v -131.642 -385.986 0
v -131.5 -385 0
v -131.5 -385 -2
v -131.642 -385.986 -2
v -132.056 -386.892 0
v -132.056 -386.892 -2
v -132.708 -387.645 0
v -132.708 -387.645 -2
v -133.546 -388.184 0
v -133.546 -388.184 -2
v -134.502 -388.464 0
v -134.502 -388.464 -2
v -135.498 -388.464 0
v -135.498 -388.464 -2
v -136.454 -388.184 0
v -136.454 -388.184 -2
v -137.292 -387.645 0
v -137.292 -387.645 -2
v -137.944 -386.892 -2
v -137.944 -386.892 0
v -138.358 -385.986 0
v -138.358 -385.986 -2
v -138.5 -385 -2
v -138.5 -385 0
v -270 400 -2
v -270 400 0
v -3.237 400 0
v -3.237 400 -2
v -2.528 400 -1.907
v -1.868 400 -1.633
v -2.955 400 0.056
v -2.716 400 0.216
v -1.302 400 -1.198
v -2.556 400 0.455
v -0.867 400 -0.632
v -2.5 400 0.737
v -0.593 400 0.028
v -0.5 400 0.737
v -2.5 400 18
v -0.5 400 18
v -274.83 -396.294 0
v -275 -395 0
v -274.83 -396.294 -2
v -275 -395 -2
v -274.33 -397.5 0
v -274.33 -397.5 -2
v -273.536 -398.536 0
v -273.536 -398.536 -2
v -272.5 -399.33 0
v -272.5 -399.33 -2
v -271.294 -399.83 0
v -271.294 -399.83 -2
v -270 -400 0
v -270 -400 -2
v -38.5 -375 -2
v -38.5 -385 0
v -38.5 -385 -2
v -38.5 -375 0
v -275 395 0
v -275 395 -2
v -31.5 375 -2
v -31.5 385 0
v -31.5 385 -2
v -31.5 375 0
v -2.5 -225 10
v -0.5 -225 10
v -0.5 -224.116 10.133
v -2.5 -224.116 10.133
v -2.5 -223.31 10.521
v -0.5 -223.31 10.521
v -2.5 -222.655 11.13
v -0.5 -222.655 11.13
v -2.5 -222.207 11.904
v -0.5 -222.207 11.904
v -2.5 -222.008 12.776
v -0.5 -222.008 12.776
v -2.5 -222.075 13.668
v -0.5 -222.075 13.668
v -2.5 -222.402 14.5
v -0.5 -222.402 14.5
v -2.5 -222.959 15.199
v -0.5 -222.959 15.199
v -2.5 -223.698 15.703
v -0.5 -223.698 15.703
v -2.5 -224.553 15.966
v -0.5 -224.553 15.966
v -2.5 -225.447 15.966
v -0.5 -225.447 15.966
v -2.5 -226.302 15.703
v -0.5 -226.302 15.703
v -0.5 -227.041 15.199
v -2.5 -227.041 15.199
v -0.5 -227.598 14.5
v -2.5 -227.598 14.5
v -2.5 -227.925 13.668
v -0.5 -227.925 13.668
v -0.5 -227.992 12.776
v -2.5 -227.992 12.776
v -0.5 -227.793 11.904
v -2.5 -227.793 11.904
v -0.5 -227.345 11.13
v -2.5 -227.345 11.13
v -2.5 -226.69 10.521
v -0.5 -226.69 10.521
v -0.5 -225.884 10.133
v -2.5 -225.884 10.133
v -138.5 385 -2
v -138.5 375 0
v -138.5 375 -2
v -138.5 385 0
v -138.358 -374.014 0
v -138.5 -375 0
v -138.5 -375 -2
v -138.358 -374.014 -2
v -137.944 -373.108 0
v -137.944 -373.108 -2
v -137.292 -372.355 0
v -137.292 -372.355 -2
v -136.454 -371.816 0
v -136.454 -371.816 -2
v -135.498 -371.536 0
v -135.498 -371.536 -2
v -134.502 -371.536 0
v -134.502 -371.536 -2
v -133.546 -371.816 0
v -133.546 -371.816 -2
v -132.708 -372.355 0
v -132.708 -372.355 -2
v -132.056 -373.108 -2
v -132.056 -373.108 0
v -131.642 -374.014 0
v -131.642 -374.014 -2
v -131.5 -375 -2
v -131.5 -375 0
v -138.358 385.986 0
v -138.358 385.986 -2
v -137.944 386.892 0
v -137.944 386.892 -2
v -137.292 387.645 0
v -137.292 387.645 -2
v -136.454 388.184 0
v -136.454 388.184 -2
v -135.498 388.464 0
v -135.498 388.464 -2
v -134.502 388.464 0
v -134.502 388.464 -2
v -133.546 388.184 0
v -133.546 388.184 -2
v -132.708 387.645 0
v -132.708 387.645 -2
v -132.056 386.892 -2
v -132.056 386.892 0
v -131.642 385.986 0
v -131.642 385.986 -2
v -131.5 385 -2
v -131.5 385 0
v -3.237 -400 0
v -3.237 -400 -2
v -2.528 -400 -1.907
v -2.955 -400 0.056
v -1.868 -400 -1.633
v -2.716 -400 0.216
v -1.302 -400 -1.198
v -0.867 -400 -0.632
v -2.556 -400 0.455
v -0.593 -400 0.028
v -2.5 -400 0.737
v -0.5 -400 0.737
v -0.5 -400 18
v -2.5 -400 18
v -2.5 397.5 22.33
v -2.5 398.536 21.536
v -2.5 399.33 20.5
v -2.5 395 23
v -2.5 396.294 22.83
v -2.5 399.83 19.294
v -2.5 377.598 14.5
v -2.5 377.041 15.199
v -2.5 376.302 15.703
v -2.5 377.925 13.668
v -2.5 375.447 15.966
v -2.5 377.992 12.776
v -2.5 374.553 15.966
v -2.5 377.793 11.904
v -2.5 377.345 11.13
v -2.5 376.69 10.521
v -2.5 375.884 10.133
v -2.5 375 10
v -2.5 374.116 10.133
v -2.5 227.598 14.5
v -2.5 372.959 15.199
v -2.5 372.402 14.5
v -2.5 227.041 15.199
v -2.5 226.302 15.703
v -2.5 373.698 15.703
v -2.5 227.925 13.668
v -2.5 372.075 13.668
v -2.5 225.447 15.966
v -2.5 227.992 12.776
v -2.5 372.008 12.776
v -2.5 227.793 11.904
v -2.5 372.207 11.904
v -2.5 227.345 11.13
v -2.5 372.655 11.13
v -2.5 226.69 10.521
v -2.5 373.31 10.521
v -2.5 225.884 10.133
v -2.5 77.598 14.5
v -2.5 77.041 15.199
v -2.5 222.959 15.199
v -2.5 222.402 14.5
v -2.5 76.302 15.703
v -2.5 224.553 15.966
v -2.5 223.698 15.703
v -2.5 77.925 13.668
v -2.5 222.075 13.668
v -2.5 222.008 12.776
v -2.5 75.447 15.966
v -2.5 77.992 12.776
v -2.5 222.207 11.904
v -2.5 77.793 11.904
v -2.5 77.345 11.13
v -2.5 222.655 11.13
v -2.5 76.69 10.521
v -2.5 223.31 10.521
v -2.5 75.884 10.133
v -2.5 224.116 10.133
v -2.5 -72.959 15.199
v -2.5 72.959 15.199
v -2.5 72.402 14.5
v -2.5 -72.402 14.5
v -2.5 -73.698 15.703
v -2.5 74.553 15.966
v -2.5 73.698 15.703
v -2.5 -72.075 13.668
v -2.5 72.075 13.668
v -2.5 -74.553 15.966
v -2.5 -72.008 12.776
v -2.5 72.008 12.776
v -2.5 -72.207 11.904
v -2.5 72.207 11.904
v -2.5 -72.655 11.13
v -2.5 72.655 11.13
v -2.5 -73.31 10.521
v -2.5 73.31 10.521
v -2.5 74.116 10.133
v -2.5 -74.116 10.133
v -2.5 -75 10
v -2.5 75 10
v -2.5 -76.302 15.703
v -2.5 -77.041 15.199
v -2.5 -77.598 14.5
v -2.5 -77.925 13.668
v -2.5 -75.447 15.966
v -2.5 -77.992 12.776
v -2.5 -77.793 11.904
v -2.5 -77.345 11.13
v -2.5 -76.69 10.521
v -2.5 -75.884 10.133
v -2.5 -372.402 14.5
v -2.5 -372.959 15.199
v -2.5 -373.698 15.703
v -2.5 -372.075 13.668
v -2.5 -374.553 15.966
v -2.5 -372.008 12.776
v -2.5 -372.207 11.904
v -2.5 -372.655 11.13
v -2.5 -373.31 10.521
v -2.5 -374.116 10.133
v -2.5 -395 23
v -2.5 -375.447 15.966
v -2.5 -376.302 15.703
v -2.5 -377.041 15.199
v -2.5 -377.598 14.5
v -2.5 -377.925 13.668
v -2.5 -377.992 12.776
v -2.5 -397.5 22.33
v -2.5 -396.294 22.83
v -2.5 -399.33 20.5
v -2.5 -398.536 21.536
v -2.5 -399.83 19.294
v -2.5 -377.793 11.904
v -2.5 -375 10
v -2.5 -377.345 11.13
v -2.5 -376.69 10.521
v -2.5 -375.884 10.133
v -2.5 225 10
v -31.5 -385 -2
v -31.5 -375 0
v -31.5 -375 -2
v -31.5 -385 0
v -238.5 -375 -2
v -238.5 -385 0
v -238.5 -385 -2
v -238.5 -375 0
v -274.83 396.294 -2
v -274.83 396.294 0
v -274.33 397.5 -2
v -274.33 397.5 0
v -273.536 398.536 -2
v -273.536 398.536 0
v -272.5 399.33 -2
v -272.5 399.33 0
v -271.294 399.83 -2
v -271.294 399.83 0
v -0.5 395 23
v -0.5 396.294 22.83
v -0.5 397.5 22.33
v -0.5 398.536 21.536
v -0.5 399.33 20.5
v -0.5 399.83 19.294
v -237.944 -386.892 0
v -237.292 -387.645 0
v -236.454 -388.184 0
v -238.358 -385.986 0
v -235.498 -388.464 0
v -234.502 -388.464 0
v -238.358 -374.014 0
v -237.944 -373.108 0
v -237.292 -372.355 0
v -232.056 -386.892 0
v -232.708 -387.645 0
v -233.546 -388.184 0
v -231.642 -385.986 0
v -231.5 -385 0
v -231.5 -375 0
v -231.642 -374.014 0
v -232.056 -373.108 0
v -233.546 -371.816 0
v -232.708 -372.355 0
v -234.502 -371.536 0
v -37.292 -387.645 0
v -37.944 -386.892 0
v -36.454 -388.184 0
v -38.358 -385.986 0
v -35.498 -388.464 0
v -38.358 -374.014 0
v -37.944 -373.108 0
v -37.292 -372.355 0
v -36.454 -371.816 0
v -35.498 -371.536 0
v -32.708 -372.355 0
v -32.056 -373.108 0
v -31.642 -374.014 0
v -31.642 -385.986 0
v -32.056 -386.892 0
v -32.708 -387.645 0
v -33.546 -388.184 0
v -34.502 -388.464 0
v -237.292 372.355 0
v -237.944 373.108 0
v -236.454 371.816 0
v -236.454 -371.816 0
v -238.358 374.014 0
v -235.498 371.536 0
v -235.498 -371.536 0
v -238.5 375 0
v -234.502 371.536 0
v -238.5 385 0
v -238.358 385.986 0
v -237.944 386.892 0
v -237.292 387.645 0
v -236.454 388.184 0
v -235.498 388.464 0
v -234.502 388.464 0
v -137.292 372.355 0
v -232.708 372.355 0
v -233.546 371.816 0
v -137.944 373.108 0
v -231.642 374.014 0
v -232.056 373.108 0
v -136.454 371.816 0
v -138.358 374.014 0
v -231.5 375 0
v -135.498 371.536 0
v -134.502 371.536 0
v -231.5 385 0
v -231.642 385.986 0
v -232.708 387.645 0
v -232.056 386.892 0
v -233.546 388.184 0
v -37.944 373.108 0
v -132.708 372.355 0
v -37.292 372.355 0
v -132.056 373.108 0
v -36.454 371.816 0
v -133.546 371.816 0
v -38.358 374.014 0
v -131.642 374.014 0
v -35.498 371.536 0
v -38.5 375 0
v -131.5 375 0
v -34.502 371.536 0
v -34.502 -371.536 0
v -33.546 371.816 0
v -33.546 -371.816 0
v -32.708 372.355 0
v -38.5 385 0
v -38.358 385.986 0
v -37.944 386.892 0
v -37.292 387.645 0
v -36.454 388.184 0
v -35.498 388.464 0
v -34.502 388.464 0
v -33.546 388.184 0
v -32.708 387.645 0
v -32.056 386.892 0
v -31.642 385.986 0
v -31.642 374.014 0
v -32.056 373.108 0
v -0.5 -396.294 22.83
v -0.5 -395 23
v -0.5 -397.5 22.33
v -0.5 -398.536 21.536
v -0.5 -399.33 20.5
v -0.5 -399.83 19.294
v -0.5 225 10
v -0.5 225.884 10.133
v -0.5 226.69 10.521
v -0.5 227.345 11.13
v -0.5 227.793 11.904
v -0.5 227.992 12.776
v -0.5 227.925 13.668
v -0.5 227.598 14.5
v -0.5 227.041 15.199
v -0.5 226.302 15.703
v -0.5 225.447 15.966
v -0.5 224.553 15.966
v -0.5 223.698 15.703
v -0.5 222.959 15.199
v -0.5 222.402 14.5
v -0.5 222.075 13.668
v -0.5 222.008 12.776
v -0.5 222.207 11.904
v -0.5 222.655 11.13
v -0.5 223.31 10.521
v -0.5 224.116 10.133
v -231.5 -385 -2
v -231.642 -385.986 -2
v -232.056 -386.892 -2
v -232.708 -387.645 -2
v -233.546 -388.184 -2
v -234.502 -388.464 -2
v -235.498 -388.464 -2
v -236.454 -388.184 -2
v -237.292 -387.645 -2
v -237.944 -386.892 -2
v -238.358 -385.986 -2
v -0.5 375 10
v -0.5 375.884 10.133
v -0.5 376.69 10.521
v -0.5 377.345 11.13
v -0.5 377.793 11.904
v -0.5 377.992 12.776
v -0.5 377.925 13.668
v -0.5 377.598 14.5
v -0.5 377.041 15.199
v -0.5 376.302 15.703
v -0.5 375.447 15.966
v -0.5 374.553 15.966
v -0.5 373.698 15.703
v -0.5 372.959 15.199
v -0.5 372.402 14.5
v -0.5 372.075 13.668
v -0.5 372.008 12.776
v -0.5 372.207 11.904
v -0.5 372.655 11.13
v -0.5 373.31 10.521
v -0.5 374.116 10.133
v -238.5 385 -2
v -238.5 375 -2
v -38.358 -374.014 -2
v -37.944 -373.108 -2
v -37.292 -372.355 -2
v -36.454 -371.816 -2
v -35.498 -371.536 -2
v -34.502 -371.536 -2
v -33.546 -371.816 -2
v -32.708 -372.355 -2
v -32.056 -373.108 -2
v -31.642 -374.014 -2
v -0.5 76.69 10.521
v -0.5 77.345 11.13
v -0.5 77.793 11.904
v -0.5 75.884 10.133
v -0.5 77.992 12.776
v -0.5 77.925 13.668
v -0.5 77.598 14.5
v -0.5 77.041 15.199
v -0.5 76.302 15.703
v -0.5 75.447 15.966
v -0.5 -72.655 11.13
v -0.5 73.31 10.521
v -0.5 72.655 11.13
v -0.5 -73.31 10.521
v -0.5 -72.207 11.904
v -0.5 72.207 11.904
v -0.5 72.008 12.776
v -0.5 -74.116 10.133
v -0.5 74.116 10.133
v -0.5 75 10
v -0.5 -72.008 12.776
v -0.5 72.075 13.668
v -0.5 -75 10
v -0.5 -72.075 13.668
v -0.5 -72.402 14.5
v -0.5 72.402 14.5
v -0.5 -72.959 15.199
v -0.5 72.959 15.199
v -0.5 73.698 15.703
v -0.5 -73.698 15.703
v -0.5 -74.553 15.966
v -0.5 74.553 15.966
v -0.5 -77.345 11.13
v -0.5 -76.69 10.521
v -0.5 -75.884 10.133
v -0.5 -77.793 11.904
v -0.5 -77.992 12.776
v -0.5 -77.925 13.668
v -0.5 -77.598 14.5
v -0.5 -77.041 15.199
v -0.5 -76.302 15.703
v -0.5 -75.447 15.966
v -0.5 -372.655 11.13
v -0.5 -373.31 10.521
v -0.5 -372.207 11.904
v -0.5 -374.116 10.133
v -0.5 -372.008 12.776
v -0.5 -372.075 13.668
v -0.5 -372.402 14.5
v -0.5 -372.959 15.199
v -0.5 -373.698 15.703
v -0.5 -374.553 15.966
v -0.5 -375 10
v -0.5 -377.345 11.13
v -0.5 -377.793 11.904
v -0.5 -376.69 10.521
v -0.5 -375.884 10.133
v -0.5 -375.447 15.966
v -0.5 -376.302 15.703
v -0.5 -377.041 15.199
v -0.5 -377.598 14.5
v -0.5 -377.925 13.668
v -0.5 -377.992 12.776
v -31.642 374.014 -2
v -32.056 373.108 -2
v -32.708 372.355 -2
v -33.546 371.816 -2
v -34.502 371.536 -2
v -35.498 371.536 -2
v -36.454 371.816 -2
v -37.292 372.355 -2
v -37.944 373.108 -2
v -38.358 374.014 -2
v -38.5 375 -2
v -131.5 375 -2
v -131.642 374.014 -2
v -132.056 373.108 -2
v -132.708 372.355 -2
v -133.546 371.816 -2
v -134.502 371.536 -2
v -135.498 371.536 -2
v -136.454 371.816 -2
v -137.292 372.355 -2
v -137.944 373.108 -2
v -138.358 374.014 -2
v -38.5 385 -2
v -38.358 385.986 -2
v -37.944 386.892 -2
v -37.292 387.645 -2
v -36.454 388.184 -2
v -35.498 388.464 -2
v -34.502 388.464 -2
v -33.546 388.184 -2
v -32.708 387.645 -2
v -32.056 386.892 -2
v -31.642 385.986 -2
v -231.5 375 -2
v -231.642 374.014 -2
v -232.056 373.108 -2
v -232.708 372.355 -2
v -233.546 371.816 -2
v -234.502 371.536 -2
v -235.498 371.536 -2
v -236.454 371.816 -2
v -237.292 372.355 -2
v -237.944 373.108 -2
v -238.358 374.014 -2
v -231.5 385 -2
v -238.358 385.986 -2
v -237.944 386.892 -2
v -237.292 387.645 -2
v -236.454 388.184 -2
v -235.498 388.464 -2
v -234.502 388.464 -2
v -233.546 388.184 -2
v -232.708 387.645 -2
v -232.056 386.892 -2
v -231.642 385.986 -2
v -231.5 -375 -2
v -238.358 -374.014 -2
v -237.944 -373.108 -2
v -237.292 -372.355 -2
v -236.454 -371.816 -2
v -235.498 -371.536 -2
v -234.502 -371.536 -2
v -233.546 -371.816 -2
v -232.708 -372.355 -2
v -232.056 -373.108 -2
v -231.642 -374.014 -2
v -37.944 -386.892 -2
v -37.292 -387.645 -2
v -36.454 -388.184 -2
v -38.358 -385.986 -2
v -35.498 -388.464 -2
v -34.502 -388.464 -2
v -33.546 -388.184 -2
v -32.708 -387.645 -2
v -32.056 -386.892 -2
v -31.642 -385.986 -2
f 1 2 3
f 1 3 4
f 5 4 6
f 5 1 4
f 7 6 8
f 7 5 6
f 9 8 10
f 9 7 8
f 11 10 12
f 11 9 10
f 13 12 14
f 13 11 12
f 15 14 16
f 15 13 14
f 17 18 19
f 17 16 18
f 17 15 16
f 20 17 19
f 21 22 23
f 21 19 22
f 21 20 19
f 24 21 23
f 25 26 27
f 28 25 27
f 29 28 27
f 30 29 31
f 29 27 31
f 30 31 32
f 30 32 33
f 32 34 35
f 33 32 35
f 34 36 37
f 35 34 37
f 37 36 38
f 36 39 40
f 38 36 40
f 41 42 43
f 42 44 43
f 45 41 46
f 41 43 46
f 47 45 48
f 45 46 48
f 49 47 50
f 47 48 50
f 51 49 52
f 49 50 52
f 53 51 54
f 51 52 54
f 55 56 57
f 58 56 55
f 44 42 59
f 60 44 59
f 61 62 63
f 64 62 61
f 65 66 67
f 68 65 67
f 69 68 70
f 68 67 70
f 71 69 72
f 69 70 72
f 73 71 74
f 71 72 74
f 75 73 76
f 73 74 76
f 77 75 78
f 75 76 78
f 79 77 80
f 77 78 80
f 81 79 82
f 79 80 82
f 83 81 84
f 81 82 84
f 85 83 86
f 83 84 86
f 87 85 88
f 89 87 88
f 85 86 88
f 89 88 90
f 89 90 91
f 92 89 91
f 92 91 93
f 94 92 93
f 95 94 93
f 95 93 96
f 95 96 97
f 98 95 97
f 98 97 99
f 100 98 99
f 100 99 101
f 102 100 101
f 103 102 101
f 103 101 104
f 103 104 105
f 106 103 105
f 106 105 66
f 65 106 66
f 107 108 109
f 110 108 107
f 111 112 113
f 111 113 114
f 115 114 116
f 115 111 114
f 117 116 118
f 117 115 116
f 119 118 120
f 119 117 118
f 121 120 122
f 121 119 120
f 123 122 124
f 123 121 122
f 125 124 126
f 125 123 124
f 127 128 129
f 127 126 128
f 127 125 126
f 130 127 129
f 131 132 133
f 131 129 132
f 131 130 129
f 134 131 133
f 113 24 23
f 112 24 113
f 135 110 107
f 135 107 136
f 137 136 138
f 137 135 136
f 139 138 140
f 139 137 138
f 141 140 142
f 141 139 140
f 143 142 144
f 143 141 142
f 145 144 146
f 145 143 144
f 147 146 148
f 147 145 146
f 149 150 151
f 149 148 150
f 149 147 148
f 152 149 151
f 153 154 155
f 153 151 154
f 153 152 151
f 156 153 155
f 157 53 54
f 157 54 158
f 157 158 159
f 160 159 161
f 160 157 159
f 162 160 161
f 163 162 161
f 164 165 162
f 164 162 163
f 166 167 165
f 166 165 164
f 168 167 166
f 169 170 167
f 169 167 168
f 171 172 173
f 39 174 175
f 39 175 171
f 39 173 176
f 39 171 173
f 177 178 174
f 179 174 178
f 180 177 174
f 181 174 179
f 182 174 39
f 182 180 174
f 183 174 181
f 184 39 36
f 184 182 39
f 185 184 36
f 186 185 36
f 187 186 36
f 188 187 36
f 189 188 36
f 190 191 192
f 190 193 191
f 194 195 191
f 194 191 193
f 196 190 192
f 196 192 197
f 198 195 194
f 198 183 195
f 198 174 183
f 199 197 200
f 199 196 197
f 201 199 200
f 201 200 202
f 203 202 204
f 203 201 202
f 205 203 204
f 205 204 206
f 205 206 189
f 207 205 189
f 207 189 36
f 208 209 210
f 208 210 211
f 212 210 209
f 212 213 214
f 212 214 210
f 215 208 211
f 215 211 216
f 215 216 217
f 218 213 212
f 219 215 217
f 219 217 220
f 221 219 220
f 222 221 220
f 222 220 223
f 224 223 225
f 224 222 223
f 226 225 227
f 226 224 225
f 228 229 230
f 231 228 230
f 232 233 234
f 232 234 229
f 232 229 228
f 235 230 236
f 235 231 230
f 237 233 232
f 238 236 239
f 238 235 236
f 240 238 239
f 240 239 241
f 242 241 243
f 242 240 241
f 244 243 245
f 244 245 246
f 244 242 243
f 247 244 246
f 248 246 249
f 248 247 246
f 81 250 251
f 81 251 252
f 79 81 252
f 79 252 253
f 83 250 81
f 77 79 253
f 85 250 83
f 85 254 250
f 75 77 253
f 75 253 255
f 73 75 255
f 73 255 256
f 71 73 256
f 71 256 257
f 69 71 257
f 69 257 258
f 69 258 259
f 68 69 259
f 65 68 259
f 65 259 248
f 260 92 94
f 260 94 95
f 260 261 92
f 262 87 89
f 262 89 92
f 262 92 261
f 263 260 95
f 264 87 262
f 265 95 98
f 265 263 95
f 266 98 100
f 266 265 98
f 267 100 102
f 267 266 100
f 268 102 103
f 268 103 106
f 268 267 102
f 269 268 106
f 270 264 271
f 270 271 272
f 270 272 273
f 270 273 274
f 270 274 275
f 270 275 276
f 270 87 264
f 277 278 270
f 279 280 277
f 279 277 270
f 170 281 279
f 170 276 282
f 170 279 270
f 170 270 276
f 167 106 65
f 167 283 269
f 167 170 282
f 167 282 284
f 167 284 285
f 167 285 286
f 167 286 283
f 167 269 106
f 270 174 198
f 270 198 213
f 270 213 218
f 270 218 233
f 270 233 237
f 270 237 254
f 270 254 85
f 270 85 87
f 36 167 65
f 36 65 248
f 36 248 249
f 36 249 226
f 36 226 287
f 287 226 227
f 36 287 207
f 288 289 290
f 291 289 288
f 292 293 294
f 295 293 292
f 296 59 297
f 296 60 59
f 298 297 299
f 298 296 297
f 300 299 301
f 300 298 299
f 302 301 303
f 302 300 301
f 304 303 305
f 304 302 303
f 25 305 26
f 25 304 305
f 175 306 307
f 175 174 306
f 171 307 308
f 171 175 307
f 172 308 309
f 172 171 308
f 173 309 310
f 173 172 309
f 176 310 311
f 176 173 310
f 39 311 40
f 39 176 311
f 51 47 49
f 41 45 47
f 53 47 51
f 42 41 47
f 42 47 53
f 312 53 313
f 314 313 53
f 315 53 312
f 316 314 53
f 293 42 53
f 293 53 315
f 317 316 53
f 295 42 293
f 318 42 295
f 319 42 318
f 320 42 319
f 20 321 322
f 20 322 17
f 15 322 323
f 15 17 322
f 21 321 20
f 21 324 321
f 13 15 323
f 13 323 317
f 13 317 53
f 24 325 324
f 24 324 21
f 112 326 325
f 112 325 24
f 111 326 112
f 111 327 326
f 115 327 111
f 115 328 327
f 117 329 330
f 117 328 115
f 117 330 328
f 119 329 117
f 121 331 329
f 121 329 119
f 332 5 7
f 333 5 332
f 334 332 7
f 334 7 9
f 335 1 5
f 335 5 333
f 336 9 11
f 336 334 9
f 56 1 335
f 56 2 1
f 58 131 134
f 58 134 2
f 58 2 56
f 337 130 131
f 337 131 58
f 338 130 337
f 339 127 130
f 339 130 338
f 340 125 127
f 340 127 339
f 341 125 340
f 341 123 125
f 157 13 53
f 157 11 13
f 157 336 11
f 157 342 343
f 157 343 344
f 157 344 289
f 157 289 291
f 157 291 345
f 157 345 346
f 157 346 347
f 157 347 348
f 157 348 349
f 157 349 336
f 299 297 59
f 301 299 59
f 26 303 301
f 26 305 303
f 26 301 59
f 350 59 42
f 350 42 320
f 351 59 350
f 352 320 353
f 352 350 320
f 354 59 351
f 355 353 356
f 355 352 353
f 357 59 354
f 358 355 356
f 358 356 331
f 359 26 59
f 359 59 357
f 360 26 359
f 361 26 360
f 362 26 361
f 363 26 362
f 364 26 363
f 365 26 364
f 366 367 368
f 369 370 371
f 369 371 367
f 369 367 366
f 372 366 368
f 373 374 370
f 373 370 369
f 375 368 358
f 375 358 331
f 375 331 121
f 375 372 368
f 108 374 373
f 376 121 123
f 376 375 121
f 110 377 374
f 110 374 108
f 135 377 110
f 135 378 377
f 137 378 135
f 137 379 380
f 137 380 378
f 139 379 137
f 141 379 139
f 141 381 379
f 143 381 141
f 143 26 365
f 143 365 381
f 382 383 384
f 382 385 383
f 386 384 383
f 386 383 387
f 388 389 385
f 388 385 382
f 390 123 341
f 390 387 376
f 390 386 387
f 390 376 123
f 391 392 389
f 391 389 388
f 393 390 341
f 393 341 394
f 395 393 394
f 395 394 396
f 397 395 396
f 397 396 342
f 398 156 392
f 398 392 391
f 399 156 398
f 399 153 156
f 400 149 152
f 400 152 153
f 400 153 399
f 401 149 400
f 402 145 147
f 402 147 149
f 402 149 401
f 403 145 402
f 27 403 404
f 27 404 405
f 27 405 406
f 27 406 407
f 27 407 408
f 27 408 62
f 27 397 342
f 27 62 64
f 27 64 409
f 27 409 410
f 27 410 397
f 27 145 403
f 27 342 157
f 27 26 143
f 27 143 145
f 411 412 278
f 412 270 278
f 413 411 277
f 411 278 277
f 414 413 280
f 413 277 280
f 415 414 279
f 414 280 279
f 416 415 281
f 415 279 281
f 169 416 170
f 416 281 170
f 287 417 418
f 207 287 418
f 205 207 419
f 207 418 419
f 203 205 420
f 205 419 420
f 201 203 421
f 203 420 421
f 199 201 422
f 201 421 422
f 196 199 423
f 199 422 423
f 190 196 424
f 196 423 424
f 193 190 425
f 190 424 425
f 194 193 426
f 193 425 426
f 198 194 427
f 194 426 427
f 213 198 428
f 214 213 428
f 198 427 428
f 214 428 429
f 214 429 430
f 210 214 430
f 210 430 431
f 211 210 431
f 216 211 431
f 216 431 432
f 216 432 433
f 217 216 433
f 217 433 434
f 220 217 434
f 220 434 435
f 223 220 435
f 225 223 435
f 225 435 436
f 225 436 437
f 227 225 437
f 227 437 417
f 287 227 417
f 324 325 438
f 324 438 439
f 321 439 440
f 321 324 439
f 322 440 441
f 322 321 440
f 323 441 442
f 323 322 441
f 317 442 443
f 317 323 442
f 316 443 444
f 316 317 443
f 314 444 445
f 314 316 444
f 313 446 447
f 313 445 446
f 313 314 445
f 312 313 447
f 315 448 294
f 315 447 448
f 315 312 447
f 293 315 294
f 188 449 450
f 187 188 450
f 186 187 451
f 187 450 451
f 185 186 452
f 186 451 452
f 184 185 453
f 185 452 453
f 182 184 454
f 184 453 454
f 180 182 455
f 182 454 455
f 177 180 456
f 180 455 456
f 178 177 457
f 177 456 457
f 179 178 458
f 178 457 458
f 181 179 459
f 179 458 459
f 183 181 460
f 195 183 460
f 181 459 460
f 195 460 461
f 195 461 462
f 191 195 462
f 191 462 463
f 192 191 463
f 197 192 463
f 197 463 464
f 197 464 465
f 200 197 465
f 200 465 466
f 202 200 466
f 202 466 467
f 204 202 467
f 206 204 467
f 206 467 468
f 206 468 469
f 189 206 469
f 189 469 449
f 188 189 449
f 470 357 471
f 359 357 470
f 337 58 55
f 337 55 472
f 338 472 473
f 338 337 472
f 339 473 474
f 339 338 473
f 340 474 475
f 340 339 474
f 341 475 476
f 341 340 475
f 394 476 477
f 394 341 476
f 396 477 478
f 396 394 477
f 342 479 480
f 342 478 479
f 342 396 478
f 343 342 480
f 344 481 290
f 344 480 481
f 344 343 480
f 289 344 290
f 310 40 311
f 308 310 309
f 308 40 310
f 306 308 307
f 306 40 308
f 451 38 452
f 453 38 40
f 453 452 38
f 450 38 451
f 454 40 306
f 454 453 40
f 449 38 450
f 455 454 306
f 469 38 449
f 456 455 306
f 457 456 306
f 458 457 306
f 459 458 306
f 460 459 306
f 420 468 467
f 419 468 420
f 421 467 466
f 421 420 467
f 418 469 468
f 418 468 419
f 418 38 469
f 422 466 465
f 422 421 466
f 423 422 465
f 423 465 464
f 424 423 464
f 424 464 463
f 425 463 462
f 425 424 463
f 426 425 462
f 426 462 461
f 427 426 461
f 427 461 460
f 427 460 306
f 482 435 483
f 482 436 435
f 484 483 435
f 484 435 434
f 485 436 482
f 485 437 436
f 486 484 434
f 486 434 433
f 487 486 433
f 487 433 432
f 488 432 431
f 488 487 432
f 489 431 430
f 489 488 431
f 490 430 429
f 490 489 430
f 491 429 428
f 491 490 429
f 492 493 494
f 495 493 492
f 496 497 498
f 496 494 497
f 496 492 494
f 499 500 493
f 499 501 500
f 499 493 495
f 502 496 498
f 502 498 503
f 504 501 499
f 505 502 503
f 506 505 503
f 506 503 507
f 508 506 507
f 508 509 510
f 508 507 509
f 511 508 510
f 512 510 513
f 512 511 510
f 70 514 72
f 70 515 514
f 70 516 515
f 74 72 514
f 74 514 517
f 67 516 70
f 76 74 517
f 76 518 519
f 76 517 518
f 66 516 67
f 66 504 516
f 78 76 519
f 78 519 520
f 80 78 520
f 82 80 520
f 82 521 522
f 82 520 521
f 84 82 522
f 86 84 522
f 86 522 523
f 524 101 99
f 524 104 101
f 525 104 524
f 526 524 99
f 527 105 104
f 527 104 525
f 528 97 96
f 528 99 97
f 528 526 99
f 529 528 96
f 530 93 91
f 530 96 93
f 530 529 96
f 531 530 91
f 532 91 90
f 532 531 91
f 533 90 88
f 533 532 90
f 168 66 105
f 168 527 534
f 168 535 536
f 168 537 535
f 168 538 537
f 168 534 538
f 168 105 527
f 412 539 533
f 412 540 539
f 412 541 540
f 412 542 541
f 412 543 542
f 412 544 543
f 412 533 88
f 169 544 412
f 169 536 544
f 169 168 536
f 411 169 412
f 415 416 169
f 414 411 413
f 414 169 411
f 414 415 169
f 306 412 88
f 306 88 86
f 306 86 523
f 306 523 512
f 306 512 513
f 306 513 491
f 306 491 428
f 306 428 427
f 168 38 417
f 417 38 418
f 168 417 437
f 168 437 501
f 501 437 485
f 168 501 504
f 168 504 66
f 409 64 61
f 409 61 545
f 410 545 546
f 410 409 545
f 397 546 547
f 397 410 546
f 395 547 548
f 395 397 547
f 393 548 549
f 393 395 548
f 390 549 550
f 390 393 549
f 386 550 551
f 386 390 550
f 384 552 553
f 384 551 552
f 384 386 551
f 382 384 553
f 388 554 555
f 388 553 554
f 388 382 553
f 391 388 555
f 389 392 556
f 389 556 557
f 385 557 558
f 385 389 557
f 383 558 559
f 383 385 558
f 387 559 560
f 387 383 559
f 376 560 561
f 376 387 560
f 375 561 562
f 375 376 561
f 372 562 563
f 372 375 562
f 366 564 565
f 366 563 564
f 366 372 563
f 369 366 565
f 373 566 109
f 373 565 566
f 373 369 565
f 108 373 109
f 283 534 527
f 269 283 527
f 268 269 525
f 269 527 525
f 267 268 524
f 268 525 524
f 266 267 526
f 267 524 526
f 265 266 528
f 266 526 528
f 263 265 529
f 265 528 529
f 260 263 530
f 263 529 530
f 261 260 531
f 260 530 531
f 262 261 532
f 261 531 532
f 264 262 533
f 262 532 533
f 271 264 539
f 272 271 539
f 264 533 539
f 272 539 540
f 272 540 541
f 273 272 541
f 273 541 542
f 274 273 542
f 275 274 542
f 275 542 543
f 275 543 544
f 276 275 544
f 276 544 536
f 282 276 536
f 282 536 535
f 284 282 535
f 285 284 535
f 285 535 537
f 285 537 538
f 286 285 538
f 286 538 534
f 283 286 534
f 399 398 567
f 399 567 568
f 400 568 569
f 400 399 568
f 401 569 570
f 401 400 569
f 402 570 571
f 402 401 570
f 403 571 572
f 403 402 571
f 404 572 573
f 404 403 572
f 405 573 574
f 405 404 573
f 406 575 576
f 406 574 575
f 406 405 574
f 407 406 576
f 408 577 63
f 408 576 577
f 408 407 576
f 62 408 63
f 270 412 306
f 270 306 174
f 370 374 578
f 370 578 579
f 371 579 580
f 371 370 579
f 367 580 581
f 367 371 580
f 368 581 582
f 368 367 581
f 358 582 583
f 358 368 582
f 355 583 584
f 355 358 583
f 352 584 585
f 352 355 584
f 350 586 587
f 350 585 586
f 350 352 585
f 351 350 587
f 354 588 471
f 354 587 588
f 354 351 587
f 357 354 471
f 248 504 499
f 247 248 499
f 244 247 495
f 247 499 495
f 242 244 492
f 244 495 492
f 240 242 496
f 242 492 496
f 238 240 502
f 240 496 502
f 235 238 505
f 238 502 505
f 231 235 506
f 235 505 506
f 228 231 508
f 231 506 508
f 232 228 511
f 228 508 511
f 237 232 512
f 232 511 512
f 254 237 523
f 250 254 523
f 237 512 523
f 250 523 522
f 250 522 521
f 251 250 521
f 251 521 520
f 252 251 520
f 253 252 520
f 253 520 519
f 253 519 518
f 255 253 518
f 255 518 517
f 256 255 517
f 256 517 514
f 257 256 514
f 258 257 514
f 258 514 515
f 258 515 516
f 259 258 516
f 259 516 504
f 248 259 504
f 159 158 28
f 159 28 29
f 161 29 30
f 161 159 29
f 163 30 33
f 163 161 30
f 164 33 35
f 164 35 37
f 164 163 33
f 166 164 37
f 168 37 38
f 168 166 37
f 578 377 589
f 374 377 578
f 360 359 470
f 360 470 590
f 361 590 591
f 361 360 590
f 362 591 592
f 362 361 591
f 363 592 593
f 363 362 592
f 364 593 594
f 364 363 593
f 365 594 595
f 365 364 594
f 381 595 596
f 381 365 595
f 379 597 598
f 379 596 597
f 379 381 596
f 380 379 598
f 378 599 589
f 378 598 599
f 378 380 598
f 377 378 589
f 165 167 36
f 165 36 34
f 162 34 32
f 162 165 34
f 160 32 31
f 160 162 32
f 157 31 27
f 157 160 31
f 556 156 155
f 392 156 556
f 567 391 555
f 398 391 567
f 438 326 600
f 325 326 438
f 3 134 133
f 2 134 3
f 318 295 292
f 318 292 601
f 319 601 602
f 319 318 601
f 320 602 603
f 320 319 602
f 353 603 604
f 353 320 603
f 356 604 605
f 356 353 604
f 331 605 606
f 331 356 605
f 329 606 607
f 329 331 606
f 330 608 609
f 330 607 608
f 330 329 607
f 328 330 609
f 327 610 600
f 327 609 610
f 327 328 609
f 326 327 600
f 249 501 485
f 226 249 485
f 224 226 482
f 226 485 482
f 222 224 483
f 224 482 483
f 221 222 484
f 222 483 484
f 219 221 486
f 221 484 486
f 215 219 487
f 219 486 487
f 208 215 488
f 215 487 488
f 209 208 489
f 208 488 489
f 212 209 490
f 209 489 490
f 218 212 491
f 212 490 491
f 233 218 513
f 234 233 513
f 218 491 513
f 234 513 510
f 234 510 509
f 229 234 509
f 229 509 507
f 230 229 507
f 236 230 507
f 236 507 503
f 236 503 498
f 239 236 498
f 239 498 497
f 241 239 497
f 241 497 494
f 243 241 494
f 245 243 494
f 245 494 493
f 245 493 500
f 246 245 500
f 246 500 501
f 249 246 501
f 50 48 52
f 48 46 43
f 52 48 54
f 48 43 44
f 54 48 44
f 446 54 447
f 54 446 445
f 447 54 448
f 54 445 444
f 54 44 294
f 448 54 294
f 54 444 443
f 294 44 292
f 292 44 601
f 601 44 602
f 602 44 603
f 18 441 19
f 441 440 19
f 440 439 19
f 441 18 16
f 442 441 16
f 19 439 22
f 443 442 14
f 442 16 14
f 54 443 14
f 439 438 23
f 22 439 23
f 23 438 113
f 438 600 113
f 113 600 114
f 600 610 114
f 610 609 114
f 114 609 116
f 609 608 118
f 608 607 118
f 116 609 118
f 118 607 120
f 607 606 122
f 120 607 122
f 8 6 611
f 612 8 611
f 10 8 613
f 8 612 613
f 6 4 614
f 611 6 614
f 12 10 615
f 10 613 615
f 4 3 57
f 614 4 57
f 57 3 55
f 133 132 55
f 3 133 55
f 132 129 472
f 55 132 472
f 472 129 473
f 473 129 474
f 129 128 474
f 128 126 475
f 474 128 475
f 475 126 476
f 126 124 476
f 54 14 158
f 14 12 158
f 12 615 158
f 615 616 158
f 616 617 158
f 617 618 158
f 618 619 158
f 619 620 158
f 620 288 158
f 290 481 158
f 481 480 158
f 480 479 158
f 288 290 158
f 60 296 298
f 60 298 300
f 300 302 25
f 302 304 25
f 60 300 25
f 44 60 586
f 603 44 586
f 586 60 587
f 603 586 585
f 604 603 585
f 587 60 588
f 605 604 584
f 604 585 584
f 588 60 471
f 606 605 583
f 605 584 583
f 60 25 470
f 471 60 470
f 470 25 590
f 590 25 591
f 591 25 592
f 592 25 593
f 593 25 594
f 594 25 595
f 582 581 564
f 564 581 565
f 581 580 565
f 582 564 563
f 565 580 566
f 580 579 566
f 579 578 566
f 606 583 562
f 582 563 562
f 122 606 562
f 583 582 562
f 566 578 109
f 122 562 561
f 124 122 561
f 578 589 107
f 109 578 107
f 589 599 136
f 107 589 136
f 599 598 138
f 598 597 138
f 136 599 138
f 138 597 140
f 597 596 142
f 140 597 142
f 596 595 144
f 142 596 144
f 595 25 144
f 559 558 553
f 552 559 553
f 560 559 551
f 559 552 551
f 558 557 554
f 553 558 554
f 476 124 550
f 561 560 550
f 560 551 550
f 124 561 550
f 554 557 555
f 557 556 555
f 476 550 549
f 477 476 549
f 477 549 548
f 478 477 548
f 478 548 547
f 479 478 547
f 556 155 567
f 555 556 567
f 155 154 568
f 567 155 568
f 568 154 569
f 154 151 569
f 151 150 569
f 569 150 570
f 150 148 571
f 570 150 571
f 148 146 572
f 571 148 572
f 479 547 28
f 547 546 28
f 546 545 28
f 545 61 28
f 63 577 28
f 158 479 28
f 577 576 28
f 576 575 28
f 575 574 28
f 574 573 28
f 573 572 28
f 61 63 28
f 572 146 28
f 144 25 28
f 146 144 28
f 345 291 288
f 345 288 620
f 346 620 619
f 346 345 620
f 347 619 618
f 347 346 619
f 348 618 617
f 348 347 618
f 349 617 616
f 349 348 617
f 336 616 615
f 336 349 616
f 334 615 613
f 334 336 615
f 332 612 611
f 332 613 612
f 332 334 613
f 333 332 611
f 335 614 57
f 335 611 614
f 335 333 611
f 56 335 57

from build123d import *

# Parameters (mm, degrees)
SKETCH_1_W                       = 550
SKETCH_1_H                       = 800
SM_BASE_FLANGE_1_DEPTH           = 2
SKETCH_6_W                       = 40
SKETCH_6_H                       = 130
CUT_EXTRUDE_1_DEPTH              = 10
FILLET_1_R                       = 5
SKETCH_7_W                       = 1
SKETCH_7_H                       = 845.505579408
CUT_EXTRUDE_2_DEPTH              = 10
SKETCH_8_W                       = 313.779033263
SKETCH_8_H                       = 811.185879887
CUT_EXTRUDE_3_DEPTH              = 10
SM_EDGE_FLANGE_1_STRIP_W         = 9.4732
SM_EDGE_FLANGE_1_STRIP_H         = 2
SM_EDGE_FLANGE_1_STRIP_CUT_DEPTH = 800
SM_EDGE_FLANGE_1_DEPTH           = 800
FILLET_2_R                       = 5
HOLE_WIZARD_7_0_7_1_D            = 7
CUT_EXTRUDE_4_DEPTH              = 10
HOLE_WIZARD_6_0_6_1_D            = 6
PATTERN_LINEAR_1_COUNT           = 6
PATTERN_LINEAR_1_PITCH           = 150


# Sheet-metal steps are written as plain solids
with BuildPart() as part:
    # Sketch 1 → 基体-法兰1 (new body)
    with BuildSketch(Plane.XY):
        Rectangle(SKETCH_1_W, SKETCH_1_H)
    extrude(amount=-SM_BASE_FLANGE_1_DEPTH)

    # 草图6 → 切除-拉伸1 (cut)
    with BuildSketch(Plane.XY):
        with Locations((255, 335)):
            Rectangle(SKETCH_6_W, SKETCH_6_H)
        with Locations((255, -335)):
            Rectangle(SKETCH_6_W, SKETCH_6_H)
    extrude(amount=-CUT_EXTRUDE_1_DEPTH, mode=Mode.SUBTRACT)

    # 圆角1
    fillet_1_edges = [part.edges().sort_by_distance(p)[0] for p in [
        (275, 270, -1),
        (235, 270, -1),
        (235, 400, -1),
        (275, -270, -1),
        (235, -400, -1),
        (235, -270, -1),
        (-275, 400, -1),
        (-275, -400, -1),
    ]]
    fillet(fillet_1_edges, radius=FILLET_1_R)

    # 草图7 → 切除-拉伸2 (cut)
    with BuildSketch(Plane.XY):
        Rectangle(SKETCH_7_W, SKETCH_7_H)
    extrude(amount=-CUT_EXTRUDE_2_DEPTH, mode=Mode.SUBTRACT)


with BuildPart() as cut_extrude_2_piece_1:
    # of the separate pieces the step leaves, piece 1, a body of its own (cut_extrude_2_pieces)
    add(part.part.solids().sort_by_distance((-0.5, -400, 0))[0])

    # 边线-法兰1 strip (across the edge) → 边线-法兰1 strip cut (cut)
    with BuildSketch(Plane(origin=(-0.5, -400, 0), x_dir=(-1, 0, 0), z_dir=(0, 1, 0))):
        with Locations((-2, -1)):
            Rectangle(SM_EDGE_FLANGE_1_STRIP_W, SM_EDGE_FLANGE_1_STRIP_H)
    extrude(amount=SM_EDGE_FLANGE_1_STRIP_CUT_DEPTH, mode=Mode.SUBTRACT)

    # 边线-法兰1 section (across the edge) → 边线-法兰1 (add)
    with BuildSketch(Plane(origin=(-0.5, -400, 0), x_dir=(-1, 0, 0), z_dir=(0, 1, 0))):
        with BuildLine():
            Line((0, 0.7366), (0, 23))
            Line((0, 23), (2, 23))
            Line((2, 23), (2, 0.7366))
            ThreePointArc((2, 0.7366), (2.215745145, 0.215745145), (2.7366, 0))
            Line((2.7366, 0), (2.7366, -2))
            ThreePointArc((2.7366, -2), (0.801531583, -1.198468417), (0, 0.7366))
        make_face()
    extrude(amount=SM_EDGE_FLANGE_1_DEPTH)

    # 圆角2
    fillet_2_edges = [cut_extrude_2_piece_1.edges().sort_by_distance(p)[0] for p in [
        (-1.5, -400, 23),
        (-1.5, 400, 23),
    ]]
    fillet(fillet_2_edges, radius=FILLET_2_R)

    # Ø7.0 (7) 直径孔1 (through all)
    with Locations(Plane.XY):
        with Locations((-235, 380), (-135, 380), (-35, 380), (-35, -380), (-135, -380), (-235, -380)):
            Hole(HOLE_WIZARD_7_0_7_1_D / 2)

    # 草图15 → 切除-拉伸4 (cut)
    with BuildSketch(Plane.XY):
        with BuildLine():
            Line((-238.5, 375), (-238.5, 385))
            ThreePointArc((-238.5, 385), (-235, 388.5), (-231.5, 385))
            Line((-231.5, 385), (-231.5, 375))
            ThreePointArc((-231.5, 375), (-235, 371.5), (-238.5, 375))
        make_face()
        with BuildLine():
            Line((-138.5, 375), (-138.5, 385))
            ThreePointArc((-138.5, 385), (-135, 388.5), (-131.5, 385))
            Line((-131.5, 385), (-131.5, 375))
            ThreePointArc((-131.5, 375), (-135, 371.5), (-138.5, 375))
        make_face()
        with BuildLine():
            Line((-38.5, 375), (-38.5, 385))
            ThreePointArc((-38.5, 385), (-35, 388.5), (-31.5, 385))
            Line((-31.5, 385), (-31.5, 375))
            ThreePointArc((-31.5, 375), (-35, 371.5), (-38.5, 375))
        make_face()
        with BuildLine():
            Line((-238.5, -385), (-238.5, -375))
            ThreePointArc((-238.5, -375), (-235, -371.5), (-231.5, -375))
            Line((-231.5, -375), (-231.5, -385))
            ThreePointArc((-231.5, -385), (-235, -388.5), (-238.5, -385))
        make_face()
        with BuildLine():
            Line((-138.5, -385), (-138.5, -375))
            ThreePointArc((-138.5, -375), (-135, -371.5), (-131.5, -375))
            Line((-131.5, -375), (-131.5, -385))
            ThreePointArc((-131.5, -385), (-135, -388.5), (-138.5, -385))
        make_face()
        with BuildLine():
            Line((-38.5, -385), (-38.5, -375))
            ThreePointArc((-38.5, -375), (-35, -371.5), (-31.5, -375))
            Line((-31.5, -375), (-31.5, -385))
            ThreePointArc((-31.5, -385), (-35, -388.5), (-38.5, -385))
        make_face()
    extrude(amount=-CUT_EXTRUDE_4_DEPTH, mode=Mode.SUBTRACT)

    # Ø6.0 (6) 直径孔1 (through all)
    with Locations(Plane.ZY.offset(2.5)):
        with Locations((13, 375)):
            hole_wizard_6_0_6_1 = Hole(HOLE_WIZARD_6_0_6_1_D / 2)

    # 阵列(线性)1: Ø6.0 (6) 直径孔1 ×6
    with Locations(*[(0, -i * PATTERN_LINEAR_1_PITCH, 0) for i in range(1, PATTERN_LINEAR_1_COUNT)]):
        add(hole_wizard_6_0_6_1, mode=Mode.SUBTRACT)


with BuildPart() as cut_extrude_2_piece_2:
    # of the separate pieces the step leaves, piece 2, a body of its own (cut_extrude_2_pieces)
    add(part.part.solids().sort_by_distance((230, -400, 0))[0])

    # 草图8 → 切除-拉伸3 (cut)
    with BuildSketch(Plane.XY):
        with Locations((157.389516632, -5.592939943)):
            Rectangle(SKETCH_8_W, SKETCH_8_H)
    extrude(amount=-CUT_EXTRUDE_3_DEPTH, mode=Mode.SUBTRACT)


solid = cut_extrude_2_piece_1.part
